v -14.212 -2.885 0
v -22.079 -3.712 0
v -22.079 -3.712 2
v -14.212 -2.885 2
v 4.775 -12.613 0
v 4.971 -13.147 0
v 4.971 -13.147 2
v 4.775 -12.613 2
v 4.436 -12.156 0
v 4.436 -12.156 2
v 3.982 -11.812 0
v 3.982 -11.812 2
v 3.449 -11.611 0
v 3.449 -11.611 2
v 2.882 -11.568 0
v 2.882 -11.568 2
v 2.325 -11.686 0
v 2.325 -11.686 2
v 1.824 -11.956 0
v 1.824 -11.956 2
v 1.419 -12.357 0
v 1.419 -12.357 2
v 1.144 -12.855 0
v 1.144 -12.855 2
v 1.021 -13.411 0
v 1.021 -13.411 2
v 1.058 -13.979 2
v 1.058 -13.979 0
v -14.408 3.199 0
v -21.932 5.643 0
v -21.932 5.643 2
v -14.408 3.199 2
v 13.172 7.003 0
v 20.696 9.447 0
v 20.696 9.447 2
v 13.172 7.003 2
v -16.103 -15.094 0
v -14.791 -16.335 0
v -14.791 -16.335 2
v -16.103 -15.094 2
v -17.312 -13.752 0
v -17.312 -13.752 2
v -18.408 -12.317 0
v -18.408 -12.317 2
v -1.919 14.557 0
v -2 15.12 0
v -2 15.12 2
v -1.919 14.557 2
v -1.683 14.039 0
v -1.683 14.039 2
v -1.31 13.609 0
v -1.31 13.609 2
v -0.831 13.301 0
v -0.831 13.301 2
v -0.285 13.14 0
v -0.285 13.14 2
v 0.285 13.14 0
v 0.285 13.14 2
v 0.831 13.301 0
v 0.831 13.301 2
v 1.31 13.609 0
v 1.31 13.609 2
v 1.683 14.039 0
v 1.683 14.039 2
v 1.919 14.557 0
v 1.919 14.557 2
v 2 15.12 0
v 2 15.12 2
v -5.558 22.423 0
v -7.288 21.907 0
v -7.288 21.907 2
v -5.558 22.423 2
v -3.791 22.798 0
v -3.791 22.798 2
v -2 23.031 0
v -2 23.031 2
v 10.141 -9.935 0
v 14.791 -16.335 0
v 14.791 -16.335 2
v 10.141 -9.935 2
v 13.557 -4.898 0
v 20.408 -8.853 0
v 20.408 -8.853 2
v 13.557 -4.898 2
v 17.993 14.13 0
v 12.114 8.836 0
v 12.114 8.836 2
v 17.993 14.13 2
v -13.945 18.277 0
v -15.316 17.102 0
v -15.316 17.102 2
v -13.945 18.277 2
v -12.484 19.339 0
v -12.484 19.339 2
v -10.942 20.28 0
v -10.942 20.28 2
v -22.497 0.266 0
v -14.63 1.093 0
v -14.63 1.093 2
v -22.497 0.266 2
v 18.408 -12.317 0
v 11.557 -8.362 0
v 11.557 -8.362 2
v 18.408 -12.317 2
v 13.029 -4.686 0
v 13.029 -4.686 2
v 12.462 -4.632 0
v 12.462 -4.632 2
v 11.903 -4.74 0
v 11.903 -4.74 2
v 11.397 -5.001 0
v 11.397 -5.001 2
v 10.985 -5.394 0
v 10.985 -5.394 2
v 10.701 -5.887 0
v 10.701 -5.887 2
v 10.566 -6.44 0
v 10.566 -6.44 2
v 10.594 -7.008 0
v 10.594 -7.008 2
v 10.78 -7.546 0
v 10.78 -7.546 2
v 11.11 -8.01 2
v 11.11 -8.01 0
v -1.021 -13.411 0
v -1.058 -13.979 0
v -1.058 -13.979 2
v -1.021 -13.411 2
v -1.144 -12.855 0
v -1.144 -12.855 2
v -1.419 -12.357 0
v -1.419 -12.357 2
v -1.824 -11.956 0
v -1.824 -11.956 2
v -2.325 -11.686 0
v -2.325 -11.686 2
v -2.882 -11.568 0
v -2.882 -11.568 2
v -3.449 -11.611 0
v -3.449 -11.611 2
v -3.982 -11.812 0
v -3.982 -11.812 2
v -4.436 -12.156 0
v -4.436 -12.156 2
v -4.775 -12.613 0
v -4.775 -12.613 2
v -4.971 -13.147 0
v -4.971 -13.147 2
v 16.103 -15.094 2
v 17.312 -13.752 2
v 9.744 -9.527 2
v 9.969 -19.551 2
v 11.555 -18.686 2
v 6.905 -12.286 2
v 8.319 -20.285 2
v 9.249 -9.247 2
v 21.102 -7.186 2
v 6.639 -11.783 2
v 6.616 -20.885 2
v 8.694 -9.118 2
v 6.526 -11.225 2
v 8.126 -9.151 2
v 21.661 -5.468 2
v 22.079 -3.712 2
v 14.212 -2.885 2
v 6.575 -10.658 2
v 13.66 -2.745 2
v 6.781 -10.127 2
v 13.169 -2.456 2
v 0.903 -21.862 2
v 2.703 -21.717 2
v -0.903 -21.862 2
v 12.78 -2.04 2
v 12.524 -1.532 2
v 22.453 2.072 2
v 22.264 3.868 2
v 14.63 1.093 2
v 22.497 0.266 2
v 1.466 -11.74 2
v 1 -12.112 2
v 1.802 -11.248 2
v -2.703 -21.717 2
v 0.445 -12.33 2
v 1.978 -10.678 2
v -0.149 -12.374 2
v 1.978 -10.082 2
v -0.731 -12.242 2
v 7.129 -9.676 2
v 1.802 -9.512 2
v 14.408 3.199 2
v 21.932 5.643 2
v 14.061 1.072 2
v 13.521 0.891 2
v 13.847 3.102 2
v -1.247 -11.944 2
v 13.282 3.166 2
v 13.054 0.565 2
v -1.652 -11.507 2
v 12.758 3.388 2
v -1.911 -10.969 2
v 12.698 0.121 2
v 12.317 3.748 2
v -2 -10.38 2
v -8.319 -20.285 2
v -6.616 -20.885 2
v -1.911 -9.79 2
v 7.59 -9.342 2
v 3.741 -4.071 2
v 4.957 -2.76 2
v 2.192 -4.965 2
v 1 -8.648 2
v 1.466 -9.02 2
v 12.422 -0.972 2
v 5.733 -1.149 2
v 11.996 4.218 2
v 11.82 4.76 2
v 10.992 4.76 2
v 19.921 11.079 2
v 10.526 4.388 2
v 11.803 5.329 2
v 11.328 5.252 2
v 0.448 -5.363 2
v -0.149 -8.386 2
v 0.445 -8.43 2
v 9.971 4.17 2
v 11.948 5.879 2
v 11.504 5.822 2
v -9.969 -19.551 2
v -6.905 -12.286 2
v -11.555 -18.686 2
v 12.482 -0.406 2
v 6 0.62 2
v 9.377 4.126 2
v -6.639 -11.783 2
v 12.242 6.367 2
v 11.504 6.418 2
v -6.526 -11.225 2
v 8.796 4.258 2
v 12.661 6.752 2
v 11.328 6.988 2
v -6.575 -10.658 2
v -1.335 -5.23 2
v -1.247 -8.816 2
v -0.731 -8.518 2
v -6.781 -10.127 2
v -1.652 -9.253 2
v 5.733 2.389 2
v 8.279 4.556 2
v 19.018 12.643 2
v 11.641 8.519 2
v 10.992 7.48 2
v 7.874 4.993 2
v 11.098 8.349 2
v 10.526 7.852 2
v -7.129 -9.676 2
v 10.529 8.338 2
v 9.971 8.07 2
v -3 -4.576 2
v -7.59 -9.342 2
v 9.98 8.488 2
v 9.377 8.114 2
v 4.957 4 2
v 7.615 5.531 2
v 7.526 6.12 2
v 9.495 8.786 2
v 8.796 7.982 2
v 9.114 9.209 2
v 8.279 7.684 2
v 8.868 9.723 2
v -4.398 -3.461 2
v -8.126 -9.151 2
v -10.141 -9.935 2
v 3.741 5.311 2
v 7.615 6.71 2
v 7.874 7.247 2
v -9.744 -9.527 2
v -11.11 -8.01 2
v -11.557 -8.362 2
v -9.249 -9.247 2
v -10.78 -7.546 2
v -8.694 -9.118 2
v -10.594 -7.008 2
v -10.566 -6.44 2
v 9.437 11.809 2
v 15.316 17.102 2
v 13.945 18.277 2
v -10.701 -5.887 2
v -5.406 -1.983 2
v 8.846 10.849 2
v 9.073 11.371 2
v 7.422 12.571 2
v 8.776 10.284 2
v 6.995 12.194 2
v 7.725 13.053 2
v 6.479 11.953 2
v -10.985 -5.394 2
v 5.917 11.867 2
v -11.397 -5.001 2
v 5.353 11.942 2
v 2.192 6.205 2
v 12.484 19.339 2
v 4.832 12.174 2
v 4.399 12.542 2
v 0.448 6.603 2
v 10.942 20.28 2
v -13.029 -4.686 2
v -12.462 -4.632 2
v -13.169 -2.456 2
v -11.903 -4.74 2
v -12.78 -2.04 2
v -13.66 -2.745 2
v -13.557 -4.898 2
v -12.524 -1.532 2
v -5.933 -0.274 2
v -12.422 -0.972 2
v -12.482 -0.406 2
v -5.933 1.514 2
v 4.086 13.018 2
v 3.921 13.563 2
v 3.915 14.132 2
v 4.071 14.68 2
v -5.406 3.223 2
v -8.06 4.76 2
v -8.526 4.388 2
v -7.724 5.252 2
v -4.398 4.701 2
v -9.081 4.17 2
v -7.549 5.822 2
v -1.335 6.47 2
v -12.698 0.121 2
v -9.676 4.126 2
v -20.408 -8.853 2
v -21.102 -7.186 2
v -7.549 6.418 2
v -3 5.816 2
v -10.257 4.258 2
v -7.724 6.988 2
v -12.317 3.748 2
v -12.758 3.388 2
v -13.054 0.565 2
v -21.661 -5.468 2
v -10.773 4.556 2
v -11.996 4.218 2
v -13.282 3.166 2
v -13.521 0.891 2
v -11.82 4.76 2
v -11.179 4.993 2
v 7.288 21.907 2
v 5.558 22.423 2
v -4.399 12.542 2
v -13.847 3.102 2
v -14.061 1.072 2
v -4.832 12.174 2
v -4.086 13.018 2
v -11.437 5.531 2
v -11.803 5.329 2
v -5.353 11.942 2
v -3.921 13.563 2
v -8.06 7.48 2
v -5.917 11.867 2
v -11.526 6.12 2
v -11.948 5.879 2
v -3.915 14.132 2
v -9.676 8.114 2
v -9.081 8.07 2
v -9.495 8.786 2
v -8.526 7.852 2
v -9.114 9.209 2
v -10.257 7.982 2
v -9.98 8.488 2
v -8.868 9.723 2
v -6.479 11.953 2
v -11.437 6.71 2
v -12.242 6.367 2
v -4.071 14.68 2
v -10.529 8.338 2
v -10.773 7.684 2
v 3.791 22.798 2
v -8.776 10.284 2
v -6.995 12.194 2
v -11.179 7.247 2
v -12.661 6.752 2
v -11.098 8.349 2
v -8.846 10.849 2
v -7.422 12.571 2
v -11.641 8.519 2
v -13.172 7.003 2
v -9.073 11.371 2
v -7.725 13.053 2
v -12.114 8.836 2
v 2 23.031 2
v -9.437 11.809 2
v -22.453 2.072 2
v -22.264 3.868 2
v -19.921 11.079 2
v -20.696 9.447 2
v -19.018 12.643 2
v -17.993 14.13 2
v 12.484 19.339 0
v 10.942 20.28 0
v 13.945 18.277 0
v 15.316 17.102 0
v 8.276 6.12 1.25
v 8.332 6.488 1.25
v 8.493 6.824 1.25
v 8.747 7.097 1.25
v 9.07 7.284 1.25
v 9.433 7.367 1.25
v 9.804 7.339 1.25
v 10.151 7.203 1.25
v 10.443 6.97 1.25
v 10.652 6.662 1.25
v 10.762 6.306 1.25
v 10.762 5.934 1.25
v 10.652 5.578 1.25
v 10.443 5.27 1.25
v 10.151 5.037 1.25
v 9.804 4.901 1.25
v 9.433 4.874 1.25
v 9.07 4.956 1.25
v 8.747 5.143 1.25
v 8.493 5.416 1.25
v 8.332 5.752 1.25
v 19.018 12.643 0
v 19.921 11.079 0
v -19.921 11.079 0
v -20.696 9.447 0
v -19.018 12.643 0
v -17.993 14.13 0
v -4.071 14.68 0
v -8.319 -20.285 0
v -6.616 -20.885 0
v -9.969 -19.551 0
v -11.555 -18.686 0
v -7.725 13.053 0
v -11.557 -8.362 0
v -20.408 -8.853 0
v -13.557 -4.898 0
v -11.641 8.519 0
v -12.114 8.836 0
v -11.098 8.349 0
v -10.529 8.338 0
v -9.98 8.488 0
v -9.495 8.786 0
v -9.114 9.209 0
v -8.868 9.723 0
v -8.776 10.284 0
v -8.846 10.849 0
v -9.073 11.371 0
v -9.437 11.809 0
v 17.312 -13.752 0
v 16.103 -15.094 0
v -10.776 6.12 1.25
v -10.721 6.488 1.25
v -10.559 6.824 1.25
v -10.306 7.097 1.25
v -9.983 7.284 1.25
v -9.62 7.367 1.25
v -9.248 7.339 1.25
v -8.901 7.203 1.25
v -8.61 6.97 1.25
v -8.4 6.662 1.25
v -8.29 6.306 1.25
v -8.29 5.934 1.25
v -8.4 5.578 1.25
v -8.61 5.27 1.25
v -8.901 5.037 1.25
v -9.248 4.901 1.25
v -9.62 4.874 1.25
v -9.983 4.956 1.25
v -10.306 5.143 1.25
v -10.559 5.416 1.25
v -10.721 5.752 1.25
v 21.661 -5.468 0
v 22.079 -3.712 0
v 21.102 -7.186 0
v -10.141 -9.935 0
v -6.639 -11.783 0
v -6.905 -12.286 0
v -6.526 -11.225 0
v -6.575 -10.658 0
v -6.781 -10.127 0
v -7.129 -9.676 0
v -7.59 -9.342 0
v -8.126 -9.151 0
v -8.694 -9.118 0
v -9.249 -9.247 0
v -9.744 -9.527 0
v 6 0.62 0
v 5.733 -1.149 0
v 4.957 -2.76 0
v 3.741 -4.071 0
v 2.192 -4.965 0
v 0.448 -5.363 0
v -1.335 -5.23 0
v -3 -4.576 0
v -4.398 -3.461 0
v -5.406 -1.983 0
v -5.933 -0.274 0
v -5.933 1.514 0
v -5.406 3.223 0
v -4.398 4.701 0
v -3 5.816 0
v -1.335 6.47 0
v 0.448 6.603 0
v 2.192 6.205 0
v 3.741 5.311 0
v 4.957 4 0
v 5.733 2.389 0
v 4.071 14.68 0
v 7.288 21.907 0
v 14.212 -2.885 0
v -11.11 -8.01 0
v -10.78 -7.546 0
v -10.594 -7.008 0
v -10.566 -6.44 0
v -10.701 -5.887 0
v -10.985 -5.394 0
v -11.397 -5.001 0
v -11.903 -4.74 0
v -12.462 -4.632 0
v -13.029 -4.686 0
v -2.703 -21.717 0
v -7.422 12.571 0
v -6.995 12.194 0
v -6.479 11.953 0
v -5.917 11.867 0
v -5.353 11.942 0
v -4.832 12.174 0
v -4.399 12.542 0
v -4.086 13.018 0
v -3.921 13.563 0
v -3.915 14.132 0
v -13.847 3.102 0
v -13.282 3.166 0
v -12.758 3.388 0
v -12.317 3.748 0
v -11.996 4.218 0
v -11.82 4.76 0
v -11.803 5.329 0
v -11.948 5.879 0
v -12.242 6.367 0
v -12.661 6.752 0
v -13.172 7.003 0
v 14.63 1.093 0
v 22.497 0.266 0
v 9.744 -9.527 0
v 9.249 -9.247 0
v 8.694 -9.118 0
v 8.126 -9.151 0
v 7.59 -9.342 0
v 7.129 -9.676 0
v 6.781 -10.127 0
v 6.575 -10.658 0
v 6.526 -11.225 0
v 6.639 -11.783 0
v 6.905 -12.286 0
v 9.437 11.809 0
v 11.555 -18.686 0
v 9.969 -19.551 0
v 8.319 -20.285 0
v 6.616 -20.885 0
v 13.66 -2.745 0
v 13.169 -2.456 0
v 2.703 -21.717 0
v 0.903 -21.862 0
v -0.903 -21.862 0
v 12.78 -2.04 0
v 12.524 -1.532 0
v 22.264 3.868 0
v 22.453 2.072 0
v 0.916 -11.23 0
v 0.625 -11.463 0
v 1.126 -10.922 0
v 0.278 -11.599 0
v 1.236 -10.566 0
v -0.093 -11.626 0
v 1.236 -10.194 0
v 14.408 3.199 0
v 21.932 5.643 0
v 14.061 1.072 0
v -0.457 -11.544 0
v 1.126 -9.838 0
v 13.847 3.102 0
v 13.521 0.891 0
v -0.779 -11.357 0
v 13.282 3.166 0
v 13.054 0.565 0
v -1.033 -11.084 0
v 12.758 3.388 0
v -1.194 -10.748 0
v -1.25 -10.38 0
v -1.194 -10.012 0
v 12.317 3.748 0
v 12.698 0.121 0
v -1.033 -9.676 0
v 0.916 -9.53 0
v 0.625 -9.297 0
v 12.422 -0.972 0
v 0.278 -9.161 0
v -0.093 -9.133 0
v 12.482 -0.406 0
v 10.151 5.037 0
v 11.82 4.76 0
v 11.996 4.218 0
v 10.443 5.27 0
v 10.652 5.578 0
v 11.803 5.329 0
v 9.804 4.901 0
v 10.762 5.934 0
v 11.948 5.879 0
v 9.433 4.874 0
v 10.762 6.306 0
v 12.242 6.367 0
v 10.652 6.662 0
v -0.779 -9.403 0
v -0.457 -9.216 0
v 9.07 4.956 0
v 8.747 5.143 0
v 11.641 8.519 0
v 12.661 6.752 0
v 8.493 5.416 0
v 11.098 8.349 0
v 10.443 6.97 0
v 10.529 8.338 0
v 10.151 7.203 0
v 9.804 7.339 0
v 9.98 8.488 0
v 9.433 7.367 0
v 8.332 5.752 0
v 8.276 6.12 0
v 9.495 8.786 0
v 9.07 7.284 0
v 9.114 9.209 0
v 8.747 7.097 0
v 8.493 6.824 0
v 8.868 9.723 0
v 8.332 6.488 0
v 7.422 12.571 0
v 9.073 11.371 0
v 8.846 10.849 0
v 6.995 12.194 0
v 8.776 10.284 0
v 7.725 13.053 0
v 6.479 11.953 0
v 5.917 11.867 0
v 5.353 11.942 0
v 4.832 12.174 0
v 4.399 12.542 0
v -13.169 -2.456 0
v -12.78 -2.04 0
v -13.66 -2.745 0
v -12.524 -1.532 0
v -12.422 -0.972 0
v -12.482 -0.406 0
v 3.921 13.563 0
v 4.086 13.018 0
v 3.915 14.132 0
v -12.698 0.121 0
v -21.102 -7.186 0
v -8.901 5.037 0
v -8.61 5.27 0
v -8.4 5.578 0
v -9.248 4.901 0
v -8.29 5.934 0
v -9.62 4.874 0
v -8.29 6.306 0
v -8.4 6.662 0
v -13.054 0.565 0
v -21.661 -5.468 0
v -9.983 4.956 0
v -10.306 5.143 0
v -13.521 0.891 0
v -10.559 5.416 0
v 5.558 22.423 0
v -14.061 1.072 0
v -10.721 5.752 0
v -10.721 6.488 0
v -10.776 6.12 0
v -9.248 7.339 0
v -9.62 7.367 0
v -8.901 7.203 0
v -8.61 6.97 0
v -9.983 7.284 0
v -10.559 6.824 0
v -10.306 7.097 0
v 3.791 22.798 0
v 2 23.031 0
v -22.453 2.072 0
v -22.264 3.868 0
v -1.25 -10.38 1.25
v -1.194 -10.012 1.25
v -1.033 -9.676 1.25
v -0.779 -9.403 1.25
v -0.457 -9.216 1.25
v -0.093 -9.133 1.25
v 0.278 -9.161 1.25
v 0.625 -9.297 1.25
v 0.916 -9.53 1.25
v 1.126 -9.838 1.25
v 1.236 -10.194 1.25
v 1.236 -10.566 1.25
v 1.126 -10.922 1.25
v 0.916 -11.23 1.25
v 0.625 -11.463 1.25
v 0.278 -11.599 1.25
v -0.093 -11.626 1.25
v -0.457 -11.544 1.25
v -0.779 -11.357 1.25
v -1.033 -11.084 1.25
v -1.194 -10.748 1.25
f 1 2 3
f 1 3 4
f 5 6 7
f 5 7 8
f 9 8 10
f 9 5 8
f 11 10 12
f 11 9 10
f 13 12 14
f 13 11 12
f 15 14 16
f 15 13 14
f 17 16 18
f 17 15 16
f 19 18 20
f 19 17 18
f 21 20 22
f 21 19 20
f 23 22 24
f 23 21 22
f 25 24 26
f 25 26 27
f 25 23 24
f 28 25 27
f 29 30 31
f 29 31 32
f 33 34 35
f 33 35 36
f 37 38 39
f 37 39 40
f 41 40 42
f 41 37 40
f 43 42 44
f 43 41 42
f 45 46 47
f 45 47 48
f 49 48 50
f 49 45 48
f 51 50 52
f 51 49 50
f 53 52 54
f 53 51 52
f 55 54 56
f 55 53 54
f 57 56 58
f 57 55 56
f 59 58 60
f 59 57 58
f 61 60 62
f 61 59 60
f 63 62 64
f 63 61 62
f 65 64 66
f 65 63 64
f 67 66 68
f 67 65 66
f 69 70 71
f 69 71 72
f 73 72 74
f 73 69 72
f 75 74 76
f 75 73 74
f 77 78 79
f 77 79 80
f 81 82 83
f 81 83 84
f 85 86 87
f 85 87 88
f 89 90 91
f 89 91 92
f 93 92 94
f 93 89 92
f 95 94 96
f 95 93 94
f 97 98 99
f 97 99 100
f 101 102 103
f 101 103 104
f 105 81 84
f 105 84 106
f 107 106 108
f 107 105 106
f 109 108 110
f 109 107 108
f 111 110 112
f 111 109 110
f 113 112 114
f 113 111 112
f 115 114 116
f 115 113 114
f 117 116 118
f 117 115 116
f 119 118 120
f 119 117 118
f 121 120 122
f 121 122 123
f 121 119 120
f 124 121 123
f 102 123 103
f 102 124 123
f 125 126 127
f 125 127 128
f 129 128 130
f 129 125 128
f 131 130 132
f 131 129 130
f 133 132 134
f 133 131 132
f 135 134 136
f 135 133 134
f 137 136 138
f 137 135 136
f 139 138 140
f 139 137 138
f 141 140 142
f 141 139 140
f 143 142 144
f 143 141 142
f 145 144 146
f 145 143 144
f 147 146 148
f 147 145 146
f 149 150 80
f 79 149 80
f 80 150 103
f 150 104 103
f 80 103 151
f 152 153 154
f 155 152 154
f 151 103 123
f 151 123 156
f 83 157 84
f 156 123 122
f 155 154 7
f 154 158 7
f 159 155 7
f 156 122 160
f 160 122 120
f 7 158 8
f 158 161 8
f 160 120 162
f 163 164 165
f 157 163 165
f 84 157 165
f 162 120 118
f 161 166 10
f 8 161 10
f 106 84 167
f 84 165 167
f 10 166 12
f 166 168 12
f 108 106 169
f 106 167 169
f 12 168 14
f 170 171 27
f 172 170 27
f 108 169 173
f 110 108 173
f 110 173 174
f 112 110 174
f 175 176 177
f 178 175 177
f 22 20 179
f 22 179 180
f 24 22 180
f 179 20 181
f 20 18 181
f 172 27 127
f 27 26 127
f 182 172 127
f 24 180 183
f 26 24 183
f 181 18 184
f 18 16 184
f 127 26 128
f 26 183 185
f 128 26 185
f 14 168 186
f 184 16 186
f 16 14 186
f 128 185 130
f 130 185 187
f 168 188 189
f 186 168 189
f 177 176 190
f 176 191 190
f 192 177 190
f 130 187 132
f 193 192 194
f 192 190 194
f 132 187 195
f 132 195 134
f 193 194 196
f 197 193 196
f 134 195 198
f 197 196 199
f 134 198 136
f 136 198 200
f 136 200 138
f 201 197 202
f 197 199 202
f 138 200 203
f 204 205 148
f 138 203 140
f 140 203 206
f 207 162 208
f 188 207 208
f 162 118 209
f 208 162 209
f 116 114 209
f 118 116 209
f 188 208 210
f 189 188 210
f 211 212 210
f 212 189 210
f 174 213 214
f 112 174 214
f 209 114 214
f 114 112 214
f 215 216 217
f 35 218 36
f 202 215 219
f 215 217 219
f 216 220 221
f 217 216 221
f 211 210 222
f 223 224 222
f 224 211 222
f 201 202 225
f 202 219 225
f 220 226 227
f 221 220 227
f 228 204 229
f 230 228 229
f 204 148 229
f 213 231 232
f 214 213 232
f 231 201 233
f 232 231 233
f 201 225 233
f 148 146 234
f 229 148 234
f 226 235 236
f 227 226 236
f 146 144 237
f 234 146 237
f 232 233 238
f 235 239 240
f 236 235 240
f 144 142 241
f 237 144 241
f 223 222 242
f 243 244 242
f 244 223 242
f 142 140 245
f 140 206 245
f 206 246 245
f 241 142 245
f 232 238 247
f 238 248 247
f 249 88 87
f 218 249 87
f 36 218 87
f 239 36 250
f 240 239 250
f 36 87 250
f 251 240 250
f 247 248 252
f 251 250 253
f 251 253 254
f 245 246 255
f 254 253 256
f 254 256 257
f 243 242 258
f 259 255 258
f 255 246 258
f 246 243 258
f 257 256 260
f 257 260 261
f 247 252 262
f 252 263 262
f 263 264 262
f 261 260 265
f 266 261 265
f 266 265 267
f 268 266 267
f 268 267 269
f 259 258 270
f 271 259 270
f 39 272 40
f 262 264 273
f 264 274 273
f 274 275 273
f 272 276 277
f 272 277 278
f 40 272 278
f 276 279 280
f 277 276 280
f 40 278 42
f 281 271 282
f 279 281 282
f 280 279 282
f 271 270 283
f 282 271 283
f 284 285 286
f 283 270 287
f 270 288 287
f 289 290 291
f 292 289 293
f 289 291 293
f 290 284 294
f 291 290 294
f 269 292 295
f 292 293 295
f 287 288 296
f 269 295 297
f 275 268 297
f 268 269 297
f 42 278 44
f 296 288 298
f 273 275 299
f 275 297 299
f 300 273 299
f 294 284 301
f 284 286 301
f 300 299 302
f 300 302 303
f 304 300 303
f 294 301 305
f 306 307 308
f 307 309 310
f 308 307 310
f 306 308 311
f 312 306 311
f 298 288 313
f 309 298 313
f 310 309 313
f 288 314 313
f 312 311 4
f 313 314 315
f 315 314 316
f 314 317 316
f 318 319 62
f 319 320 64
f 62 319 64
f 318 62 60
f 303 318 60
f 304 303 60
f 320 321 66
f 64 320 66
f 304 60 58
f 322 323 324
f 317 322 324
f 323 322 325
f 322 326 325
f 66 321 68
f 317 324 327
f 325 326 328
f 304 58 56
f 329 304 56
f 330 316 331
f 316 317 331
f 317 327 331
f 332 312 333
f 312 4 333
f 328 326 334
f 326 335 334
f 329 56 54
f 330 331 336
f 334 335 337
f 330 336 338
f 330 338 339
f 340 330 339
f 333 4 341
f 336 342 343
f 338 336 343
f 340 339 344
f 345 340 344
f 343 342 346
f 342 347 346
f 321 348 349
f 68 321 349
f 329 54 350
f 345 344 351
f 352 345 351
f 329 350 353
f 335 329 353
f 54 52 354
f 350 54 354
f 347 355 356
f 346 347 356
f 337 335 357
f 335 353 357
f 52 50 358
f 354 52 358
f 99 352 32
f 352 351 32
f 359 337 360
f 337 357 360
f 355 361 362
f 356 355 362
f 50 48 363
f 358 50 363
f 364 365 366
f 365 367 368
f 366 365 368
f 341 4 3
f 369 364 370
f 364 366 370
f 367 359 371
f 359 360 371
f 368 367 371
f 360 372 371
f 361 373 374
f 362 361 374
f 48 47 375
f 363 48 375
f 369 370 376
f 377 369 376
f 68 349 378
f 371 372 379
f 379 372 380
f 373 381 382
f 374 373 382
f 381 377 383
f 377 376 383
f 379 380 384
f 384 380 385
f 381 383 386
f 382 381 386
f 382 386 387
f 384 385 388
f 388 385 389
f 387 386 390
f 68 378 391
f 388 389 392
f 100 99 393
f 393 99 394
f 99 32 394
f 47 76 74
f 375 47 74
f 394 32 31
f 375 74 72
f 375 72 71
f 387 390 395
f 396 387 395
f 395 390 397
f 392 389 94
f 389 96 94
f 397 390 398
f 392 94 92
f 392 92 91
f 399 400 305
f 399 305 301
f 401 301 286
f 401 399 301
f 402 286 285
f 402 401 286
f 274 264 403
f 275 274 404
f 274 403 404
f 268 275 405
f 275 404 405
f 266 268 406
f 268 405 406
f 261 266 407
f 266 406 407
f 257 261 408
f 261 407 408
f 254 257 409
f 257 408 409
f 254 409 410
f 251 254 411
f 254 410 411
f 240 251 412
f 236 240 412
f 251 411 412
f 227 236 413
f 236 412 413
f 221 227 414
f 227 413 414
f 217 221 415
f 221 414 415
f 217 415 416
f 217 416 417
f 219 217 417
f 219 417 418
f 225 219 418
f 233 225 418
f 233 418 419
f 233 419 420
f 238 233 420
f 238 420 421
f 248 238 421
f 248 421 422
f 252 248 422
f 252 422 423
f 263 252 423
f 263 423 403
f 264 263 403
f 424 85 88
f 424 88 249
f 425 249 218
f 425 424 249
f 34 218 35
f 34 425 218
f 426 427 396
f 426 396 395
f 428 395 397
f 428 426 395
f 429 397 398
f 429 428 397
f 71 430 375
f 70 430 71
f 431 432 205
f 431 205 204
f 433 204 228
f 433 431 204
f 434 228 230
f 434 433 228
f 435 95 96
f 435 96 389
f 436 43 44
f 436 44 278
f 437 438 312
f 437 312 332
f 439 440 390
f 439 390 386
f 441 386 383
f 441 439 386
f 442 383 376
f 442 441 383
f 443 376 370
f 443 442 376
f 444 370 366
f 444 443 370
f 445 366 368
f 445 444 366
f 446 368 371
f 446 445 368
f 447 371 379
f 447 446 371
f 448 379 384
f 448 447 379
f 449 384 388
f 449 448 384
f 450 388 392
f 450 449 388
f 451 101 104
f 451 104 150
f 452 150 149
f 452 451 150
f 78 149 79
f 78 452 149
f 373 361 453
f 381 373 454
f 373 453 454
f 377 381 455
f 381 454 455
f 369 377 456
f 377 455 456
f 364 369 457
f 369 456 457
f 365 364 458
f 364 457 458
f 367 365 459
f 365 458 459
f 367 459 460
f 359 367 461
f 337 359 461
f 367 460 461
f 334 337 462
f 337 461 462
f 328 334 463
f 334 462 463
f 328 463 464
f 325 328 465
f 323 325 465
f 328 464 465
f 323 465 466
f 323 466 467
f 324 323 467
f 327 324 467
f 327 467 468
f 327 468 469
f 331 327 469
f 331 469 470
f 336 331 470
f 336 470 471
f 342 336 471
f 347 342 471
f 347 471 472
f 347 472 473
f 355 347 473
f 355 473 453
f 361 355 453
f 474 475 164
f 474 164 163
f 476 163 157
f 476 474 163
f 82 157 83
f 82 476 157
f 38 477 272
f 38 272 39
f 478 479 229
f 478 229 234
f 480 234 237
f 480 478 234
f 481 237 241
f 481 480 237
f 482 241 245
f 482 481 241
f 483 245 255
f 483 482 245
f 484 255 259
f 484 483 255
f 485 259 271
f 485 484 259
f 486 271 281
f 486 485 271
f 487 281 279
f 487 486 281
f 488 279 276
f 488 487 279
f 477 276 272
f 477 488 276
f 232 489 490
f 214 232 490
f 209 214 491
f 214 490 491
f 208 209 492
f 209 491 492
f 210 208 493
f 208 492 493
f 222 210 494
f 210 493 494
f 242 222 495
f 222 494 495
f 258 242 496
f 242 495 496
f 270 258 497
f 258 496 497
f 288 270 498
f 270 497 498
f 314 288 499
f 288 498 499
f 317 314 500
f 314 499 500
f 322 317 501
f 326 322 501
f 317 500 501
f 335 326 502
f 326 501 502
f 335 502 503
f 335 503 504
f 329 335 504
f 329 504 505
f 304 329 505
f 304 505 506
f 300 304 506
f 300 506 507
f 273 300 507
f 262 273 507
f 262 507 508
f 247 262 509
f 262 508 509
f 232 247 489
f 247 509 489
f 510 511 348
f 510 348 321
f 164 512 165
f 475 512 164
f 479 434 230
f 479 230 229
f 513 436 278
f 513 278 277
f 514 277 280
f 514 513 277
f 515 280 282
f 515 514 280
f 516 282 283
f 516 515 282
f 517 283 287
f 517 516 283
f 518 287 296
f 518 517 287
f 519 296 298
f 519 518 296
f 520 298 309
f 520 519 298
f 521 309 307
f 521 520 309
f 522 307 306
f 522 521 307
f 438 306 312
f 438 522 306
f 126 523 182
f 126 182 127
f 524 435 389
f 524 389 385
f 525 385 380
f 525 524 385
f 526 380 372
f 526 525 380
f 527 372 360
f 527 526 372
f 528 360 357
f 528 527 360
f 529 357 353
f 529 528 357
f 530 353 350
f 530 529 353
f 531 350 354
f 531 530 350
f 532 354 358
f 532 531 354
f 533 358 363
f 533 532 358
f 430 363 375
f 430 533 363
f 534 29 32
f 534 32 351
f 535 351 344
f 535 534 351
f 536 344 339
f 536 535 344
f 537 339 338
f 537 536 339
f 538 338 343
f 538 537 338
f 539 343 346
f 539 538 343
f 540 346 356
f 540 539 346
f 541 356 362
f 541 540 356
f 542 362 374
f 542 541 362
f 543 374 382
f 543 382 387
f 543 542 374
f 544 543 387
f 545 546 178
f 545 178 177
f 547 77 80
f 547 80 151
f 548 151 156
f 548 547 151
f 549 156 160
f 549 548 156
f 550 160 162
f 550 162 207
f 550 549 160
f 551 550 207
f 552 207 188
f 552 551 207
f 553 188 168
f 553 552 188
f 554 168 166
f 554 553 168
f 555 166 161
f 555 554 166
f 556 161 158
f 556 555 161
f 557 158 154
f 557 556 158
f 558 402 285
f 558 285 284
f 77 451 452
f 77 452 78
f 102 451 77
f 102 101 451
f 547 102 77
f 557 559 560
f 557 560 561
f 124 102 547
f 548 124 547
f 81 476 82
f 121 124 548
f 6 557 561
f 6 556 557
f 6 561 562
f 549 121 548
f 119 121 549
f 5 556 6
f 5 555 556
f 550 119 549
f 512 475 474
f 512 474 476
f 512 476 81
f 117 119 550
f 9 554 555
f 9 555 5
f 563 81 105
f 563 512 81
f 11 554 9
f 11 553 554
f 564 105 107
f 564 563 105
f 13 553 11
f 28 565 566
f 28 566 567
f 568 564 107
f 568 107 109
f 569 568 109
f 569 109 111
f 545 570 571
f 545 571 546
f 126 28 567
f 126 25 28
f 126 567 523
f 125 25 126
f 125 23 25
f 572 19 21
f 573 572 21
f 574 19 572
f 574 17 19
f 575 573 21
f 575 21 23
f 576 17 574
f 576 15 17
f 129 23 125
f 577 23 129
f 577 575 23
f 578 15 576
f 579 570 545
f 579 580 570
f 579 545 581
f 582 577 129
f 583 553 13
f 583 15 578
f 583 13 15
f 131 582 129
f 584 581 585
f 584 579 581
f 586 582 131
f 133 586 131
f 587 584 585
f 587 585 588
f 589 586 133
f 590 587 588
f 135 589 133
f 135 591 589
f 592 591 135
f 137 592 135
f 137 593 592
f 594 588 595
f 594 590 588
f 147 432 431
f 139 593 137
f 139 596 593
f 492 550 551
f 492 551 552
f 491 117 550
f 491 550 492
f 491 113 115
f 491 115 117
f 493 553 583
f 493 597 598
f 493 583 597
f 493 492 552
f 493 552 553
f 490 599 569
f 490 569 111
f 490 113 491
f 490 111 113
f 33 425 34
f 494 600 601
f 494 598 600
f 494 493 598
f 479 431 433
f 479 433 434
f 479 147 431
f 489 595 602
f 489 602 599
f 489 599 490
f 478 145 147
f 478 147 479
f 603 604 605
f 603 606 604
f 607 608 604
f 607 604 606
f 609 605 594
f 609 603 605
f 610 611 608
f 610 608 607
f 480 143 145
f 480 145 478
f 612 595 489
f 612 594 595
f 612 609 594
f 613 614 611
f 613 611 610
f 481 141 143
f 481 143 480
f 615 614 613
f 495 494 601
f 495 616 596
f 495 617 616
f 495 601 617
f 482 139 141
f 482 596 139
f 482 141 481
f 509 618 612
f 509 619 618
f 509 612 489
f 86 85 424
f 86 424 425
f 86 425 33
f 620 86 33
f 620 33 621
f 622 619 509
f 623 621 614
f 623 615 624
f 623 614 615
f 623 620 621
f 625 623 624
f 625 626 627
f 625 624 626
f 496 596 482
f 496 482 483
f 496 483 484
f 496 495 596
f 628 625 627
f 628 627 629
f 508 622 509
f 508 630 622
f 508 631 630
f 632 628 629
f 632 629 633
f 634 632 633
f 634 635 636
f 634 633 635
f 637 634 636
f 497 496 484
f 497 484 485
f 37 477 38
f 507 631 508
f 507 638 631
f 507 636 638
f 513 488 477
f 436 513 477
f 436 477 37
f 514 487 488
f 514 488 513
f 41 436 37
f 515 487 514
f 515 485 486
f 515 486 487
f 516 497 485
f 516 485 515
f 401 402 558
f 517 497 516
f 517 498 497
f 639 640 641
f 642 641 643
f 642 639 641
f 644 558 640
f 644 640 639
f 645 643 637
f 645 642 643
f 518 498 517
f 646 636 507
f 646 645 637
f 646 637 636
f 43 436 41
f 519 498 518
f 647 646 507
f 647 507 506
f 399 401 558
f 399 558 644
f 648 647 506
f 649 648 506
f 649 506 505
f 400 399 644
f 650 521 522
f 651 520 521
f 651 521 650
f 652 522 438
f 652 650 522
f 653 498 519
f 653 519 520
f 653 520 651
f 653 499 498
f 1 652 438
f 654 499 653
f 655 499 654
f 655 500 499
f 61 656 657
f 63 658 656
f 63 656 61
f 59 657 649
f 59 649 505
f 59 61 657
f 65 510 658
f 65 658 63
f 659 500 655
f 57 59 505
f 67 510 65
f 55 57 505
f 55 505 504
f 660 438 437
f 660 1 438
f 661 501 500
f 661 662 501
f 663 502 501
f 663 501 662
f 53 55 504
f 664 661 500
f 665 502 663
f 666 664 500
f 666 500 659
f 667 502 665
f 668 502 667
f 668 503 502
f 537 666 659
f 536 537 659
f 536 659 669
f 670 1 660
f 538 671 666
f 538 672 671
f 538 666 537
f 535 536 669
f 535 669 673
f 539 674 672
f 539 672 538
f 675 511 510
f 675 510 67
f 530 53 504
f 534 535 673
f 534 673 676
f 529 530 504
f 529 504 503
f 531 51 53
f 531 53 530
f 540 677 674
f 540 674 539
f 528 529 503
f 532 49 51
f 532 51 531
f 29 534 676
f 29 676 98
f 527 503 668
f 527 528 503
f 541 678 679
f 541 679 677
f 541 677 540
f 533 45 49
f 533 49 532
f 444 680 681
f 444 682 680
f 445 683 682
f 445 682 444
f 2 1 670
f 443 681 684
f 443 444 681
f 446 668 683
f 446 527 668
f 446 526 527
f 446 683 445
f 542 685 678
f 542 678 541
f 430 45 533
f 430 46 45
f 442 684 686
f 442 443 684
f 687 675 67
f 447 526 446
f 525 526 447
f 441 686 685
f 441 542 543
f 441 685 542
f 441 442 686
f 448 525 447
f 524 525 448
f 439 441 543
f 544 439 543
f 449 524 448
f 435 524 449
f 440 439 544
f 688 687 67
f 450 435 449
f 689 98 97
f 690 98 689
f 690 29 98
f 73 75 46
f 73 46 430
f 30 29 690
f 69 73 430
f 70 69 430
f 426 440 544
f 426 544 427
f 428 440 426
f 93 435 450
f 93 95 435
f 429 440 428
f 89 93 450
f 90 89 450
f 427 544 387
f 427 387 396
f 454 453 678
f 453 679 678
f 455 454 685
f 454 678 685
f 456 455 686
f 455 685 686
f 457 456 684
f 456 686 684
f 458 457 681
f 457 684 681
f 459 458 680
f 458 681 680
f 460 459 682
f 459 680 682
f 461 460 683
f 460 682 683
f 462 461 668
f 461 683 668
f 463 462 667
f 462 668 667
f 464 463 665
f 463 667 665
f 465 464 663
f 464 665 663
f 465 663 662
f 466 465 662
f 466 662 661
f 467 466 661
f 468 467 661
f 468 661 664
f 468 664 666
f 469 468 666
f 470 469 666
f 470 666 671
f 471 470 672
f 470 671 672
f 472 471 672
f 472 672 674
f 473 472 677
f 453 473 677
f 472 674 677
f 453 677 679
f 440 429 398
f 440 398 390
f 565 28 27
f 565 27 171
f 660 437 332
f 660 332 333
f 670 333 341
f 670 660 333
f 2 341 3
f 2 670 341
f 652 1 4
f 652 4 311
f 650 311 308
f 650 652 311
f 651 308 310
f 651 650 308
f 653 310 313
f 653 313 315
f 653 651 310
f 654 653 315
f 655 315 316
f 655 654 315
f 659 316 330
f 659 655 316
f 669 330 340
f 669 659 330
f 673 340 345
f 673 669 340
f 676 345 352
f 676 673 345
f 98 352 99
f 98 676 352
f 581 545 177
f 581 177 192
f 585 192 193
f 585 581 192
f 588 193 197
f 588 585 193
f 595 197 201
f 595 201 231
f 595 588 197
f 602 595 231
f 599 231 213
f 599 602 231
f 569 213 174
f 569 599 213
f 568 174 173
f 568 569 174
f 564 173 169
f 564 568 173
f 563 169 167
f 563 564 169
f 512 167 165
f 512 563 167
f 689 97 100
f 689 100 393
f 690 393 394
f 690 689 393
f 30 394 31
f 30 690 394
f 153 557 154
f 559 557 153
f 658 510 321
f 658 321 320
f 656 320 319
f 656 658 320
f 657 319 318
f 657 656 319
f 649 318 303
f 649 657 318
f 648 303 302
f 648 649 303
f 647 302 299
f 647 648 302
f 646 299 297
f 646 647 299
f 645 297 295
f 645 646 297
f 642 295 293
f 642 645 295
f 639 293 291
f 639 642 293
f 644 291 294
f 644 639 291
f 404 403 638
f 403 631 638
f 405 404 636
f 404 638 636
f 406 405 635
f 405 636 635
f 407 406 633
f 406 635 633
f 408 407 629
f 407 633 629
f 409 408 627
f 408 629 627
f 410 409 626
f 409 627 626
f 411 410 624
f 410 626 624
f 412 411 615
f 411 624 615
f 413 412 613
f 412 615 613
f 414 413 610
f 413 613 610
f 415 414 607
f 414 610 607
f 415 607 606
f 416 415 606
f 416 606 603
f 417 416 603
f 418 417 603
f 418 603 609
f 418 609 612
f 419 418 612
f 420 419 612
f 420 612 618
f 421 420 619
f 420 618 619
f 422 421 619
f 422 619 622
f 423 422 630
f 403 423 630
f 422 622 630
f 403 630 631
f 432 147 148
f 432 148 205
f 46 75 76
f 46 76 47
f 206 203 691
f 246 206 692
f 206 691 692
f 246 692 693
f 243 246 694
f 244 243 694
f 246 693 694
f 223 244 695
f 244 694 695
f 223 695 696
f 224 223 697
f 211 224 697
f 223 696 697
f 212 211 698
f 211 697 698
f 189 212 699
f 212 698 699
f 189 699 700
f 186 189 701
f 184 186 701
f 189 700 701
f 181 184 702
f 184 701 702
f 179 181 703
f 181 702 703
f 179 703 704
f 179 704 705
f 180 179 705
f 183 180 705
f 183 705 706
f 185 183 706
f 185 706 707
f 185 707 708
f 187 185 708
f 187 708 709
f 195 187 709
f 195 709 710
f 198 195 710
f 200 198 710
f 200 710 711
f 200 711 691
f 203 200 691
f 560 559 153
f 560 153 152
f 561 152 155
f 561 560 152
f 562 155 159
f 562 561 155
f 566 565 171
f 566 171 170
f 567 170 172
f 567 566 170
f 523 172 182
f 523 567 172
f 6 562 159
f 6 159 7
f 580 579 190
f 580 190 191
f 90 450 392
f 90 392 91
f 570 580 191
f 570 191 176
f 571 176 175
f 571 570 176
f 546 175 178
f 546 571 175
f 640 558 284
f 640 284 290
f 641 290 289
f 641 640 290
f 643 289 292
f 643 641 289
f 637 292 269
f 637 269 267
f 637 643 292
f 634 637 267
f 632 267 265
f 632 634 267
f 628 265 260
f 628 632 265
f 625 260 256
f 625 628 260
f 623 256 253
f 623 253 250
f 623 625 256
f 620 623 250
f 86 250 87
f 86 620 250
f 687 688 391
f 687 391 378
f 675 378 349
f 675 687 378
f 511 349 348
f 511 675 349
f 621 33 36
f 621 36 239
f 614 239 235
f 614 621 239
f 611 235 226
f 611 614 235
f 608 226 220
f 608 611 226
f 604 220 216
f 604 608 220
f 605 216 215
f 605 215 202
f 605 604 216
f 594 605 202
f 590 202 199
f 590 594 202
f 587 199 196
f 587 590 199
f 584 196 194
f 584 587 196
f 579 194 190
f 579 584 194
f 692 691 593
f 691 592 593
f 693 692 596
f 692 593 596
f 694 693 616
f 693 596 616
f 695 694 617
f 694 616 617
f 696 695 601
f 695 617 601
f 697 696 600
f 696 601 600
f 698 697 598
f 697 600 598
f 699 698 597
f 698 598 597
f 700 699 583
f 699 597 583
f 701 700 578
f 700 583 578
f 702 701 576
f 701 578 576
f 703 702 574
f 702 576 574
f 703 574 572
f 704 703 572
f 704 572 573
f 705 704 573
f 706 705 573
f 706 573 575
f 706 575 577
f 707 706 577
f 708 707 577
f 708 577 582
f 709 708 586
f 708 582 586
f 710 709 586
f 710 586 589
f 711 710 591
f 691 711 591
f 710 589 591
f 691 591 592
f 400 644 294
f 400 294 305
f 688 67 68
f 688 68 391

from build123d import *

# Parameters (mm, degrees)
SKETCH1_R                     = 1
SKETCH1_R_2                   = 6
BOSS_EXTRUDE1_DEPTH           = 2
CSK_FOR_M3_SFHCS1_D           = 2.5
CSK_FOR_M3_SFHCS1_DEPTH       = 9.5
CSK_FOR_M3_SFHCS1_CSINK_D     = 4
CSK_FOR_M3_SFHCS1_CSINK_ANGLE = 90
CSK_FOR_M3_SFHCS1_TIP         = 0.751075774


with BuildPart() as part:
    # Sketch1 → Boss-Extrude1 (new body)
    with BuildSketch(Plane(origin=(0, 0, 0), x_dir=(-1, 0, 0), z_dir=(0, 0, -1))):
        with BuildLine():
            Line((-15.316309042, 17.102154929), (-9.437338757, 11.808706309))
            ThreePointArc((-9.437338757, 11.808706309), (-9.289310319, 8.984155445), (-12.113861182, 8.836127007))
            Line((-12.113861182, 8.836127007), (-17.992831467, 14.129575627))
            ThreePointArc((-17.992831467, 14.129575627), (-19.485571585, 11.870022867), (-20.696031618, 9.447495623))
            Line((-20.696031618, 9.447495623), (-13.172285497, 7.002882316))
            ThreePointArc((-13.172285497, 7.002882316), (-11.888206454, 4.482735294), (-14.408353475, 3.198656251))
            Line((-14.408353475, 3.198656251), (-21.932099596, 5.643269556))
            ThreePointArc((-21.932099596, 5.643269556), (-22.376742646, 2.971913289), (-22.497222312, 0.266486078))
            Line((-22.497222312, 0.266486078), (-14.62962441, 1.093403939))
            ThreePointArc((-14.62962441, 1.093403939), (-12.431523692, -0.686582926), (-14.211510557, -2.884683643))
            Line((-14.211510557, -2.884683643), (-22.079108459, -3.711601503))
            ThreePointArc((-22.079108459, -3.711601503), (-21.398771617, -6.332859507), (-20.408438887, -8.853393742))
            Line((-20.408438887, -8.853393742), (-13.557368355, -4.897926326))
            ThreePointArc((-13.557368355, -4.897926326), (-10.825317547, -5.629977134), (-11.557368355, -8.362027942))
            Line((-11.557368355, -8.362027942), (-18.408438886, -12.317495358))
            ThreePointArc((-18.408438886, -12.317495358), (-16.720758571, -14.435415779), (-14.790850969, -16.335233771))
            Line((-14.790850969, -16.335233771), (-10.140920148, -9.935153049))
            ThreePointArc((-10.140920148, -9.935153049), (-7.347315654, -9.492689564), (-6.90485217, -12.286294058))
            Line((-6.90485217, -12.286294058), (-11.554782995, -18.686374777))
            ThreePointArc((-11.554782995, -18.686374777), (-9.151574469, -19.934749931), (-6.615790555, -20.885355888))
            Line((-6.615790555, -20.885355888), (-4.971014718, -13.147293963))
            ThreePointArc((-4.971014718, -13.147293963), (-2.598896135, -11.606822144), (-1.058424316, -13.978940727))
            Line((-1.058424316, -13.978940727), (-2.703200152, -21.717002651))
            ThreePointArc((-2.703200152, -21.717002651), (-3e-09, -21.879977134), (2.703200146, -21.717002651))
            Line((2.703200146, -21.717002651), (1.058424314, -13.978940725))
            ThreePointArc((1.058424314, -13.978940725), (2.598896135, -11.606822143), (4.971014718, -13.147293963))
            Line((4.971014718, -13.147293963), (6.615790554, -20.885355888))
            ThreePointArc((6.615790554, -20.885355888), (9.151574469, -19.934749931), (11.554782995, -18.686374777))
            Line((11.554782995, -18.686374777), (6.904852169, -12.286294058))
            ThreePointArc((6.904852169, -12.286294058), (7.347315653, -9.492689564), (10.140920146, -9.935153048))
            Line((10.140920146, -9.935153048), (14.790850972, -16.335233768))
            ThreePointArc((14.790850972, -16.335233768), (16.720758571, -14.435415779), (18.408438883, -12.317495361))
            Line((18.408438883, -12.317495361), (11.557368352, -8.362027946))
            ThreePointArc((11.557368352, -8.362027946), (10.825317543, -5.629977135), (13.557368354, -4.897926327))
            Line((13.557368354, -4.897926327), (20.408438886, -8.853393742))
            ThreePointArc((20.408438886, -8.853393742), (21.398771616, -6.332859507), (22.079108458, -3.711601502))
            Line((22.079108458, -3.711601502), (14.211510556, -2.884683643))
            ThreePointArc((14.211510556, -2.884683643), (12.431523691, -0.686582926), (14.629624409, 1.093403939))
            Line((14.629624409, 1.093403939), (22.497222311, 0.266486078))
            ThreePointArc((22.497222311, 0.266486078), (22.376742645, 2.971913287), (21.932099596, 5.643269552))
            Line((21.932099596, 5.643269552), (14.408353473, 3.19865625))
            ThreePointArc((14.408353473, 3.19865625), (11.888206452, 4.482735295), (13.172285497, 7.002882316))
            Line((13.172285497, 7.002882316), (20.696031618, 9.447495621))
            ThreePointArc((20.696031618, 9.447495621), (19.485571584, 11.870022866), (17.992831465, 14.129575628))
            Line((17.992831465, 14.129575628), (12.113861182, 8.836127007))
            ThreePointArc((12.113861182, 8.836127007), (9.289310318, 8.984155445), (9.437338756, 11.808706308))
            Line((9.437338756, 11.808706308), (15.316309041, 17.102154929))
            ThreePointArc((15.316309041, 17.102154929), (13.225168178, 18.822905238), (10.94243932, 20.279957294))
            Line((10.94243932, 20.279957294), (7.724772239, 13.052958714))
            ThreePointArc((7.724772239, 13.052958714), (5.084208037, 12.039341086), (4.070590408, 14.679905287))
            Line((4.070590408, 14.679905287), (7.288257486, 21.906903868))
            ThreePointArc((7.288257486, 21.906903868), (4.67801304, 22.628343883), (1.999999993, 23.030957697))
            Line((1.999999993, 23.030957697), (1.999999993, 15.120022866))
            ThreePointArc((1.999999993, 15.120022866), (-1e-09, 13.120022872), (-1.999999995, 15.120022866))
            Line((-1.999999995, 15.120022866), (-1.999999995, 23.030957697))
            ThreePointArc((-1.999999995, 23.030957697), (-4.67801304, 22.628343883), (-7.288257483, 21.906903869))
            Line((-7.288257483, 21.906903869), (-4.070590409, 14.679905287))
            ThreePointArc((-4.070590409, 14.679905287), (-5.084208039, 12.039341085), (-7.72477224, 13.052958715))
            Line((-7.72477224, 13.052958715), (-10.942439317, 20.279957296))
            ThreePointArc((-10.942439317, 20.279957296), (-13.225168177, 18.822905239), (-15.316309042, 17.102154929))
        make_face()
        with Locations(Location((9.526279442, 6.120022866, 0), (0, 0, 180))):
            Circle(SKETCH1_R, mode=Mode.SUBTRACT)
        with Locations(Location((-9.526279442, 6.120022866, 0), (0, 0, 180))):
            Circle(SKETCH1_R, mode=Mode.SUBTRACT)
        with Locations(Location((0, -10.379977134, 0), (0, 0, 180))):
            Circle(SKETCH1_R, mode=Mode.SUBTRACT)
        with Locations(Location((0, 0.620022866, 0), (0, 0, 180))):
            Circle(SKETCH1_R_2, mode=Mode.SUBTRACT)
    extrude(amount=-BOSS_EXTRUDE1_DEPTH)

    # CSK for M3 SFHCS1
    with Locations(Plane(origin=(-9.526279442, 6.120022866, 2), x_dir=(1, 0, 0), z_dir=(0, 0, 1))):
        with Locations((0, 0), (19.052558884, 0), (9.526279442, -16.5)):
            CounterSinkHole(CSK_FOR_M3_SFHCS1_D / 2, CSK_FOR_M3_SFHCS1_CSINK_D / 2, depth=CSK_FOR_M3_SFHCS1_DEPTH, counter_sink_angle=CSK_FOR_M3_SFHCS1_CSINK_ANGLE)
            with Locations((0, 0, -(CSK_FOR_M3_SFHCS1_DEPTH + CSK_FOR_M3_SFHCS1_TIP / 2))):  # 118° drill point
                Cone(0, CSK_FOR_M3_SFHCS1_D / 2, CSK_FOR_M3_SFHCS1_TIP, mode=Mode.SUBTRACT)


solid = part.part
